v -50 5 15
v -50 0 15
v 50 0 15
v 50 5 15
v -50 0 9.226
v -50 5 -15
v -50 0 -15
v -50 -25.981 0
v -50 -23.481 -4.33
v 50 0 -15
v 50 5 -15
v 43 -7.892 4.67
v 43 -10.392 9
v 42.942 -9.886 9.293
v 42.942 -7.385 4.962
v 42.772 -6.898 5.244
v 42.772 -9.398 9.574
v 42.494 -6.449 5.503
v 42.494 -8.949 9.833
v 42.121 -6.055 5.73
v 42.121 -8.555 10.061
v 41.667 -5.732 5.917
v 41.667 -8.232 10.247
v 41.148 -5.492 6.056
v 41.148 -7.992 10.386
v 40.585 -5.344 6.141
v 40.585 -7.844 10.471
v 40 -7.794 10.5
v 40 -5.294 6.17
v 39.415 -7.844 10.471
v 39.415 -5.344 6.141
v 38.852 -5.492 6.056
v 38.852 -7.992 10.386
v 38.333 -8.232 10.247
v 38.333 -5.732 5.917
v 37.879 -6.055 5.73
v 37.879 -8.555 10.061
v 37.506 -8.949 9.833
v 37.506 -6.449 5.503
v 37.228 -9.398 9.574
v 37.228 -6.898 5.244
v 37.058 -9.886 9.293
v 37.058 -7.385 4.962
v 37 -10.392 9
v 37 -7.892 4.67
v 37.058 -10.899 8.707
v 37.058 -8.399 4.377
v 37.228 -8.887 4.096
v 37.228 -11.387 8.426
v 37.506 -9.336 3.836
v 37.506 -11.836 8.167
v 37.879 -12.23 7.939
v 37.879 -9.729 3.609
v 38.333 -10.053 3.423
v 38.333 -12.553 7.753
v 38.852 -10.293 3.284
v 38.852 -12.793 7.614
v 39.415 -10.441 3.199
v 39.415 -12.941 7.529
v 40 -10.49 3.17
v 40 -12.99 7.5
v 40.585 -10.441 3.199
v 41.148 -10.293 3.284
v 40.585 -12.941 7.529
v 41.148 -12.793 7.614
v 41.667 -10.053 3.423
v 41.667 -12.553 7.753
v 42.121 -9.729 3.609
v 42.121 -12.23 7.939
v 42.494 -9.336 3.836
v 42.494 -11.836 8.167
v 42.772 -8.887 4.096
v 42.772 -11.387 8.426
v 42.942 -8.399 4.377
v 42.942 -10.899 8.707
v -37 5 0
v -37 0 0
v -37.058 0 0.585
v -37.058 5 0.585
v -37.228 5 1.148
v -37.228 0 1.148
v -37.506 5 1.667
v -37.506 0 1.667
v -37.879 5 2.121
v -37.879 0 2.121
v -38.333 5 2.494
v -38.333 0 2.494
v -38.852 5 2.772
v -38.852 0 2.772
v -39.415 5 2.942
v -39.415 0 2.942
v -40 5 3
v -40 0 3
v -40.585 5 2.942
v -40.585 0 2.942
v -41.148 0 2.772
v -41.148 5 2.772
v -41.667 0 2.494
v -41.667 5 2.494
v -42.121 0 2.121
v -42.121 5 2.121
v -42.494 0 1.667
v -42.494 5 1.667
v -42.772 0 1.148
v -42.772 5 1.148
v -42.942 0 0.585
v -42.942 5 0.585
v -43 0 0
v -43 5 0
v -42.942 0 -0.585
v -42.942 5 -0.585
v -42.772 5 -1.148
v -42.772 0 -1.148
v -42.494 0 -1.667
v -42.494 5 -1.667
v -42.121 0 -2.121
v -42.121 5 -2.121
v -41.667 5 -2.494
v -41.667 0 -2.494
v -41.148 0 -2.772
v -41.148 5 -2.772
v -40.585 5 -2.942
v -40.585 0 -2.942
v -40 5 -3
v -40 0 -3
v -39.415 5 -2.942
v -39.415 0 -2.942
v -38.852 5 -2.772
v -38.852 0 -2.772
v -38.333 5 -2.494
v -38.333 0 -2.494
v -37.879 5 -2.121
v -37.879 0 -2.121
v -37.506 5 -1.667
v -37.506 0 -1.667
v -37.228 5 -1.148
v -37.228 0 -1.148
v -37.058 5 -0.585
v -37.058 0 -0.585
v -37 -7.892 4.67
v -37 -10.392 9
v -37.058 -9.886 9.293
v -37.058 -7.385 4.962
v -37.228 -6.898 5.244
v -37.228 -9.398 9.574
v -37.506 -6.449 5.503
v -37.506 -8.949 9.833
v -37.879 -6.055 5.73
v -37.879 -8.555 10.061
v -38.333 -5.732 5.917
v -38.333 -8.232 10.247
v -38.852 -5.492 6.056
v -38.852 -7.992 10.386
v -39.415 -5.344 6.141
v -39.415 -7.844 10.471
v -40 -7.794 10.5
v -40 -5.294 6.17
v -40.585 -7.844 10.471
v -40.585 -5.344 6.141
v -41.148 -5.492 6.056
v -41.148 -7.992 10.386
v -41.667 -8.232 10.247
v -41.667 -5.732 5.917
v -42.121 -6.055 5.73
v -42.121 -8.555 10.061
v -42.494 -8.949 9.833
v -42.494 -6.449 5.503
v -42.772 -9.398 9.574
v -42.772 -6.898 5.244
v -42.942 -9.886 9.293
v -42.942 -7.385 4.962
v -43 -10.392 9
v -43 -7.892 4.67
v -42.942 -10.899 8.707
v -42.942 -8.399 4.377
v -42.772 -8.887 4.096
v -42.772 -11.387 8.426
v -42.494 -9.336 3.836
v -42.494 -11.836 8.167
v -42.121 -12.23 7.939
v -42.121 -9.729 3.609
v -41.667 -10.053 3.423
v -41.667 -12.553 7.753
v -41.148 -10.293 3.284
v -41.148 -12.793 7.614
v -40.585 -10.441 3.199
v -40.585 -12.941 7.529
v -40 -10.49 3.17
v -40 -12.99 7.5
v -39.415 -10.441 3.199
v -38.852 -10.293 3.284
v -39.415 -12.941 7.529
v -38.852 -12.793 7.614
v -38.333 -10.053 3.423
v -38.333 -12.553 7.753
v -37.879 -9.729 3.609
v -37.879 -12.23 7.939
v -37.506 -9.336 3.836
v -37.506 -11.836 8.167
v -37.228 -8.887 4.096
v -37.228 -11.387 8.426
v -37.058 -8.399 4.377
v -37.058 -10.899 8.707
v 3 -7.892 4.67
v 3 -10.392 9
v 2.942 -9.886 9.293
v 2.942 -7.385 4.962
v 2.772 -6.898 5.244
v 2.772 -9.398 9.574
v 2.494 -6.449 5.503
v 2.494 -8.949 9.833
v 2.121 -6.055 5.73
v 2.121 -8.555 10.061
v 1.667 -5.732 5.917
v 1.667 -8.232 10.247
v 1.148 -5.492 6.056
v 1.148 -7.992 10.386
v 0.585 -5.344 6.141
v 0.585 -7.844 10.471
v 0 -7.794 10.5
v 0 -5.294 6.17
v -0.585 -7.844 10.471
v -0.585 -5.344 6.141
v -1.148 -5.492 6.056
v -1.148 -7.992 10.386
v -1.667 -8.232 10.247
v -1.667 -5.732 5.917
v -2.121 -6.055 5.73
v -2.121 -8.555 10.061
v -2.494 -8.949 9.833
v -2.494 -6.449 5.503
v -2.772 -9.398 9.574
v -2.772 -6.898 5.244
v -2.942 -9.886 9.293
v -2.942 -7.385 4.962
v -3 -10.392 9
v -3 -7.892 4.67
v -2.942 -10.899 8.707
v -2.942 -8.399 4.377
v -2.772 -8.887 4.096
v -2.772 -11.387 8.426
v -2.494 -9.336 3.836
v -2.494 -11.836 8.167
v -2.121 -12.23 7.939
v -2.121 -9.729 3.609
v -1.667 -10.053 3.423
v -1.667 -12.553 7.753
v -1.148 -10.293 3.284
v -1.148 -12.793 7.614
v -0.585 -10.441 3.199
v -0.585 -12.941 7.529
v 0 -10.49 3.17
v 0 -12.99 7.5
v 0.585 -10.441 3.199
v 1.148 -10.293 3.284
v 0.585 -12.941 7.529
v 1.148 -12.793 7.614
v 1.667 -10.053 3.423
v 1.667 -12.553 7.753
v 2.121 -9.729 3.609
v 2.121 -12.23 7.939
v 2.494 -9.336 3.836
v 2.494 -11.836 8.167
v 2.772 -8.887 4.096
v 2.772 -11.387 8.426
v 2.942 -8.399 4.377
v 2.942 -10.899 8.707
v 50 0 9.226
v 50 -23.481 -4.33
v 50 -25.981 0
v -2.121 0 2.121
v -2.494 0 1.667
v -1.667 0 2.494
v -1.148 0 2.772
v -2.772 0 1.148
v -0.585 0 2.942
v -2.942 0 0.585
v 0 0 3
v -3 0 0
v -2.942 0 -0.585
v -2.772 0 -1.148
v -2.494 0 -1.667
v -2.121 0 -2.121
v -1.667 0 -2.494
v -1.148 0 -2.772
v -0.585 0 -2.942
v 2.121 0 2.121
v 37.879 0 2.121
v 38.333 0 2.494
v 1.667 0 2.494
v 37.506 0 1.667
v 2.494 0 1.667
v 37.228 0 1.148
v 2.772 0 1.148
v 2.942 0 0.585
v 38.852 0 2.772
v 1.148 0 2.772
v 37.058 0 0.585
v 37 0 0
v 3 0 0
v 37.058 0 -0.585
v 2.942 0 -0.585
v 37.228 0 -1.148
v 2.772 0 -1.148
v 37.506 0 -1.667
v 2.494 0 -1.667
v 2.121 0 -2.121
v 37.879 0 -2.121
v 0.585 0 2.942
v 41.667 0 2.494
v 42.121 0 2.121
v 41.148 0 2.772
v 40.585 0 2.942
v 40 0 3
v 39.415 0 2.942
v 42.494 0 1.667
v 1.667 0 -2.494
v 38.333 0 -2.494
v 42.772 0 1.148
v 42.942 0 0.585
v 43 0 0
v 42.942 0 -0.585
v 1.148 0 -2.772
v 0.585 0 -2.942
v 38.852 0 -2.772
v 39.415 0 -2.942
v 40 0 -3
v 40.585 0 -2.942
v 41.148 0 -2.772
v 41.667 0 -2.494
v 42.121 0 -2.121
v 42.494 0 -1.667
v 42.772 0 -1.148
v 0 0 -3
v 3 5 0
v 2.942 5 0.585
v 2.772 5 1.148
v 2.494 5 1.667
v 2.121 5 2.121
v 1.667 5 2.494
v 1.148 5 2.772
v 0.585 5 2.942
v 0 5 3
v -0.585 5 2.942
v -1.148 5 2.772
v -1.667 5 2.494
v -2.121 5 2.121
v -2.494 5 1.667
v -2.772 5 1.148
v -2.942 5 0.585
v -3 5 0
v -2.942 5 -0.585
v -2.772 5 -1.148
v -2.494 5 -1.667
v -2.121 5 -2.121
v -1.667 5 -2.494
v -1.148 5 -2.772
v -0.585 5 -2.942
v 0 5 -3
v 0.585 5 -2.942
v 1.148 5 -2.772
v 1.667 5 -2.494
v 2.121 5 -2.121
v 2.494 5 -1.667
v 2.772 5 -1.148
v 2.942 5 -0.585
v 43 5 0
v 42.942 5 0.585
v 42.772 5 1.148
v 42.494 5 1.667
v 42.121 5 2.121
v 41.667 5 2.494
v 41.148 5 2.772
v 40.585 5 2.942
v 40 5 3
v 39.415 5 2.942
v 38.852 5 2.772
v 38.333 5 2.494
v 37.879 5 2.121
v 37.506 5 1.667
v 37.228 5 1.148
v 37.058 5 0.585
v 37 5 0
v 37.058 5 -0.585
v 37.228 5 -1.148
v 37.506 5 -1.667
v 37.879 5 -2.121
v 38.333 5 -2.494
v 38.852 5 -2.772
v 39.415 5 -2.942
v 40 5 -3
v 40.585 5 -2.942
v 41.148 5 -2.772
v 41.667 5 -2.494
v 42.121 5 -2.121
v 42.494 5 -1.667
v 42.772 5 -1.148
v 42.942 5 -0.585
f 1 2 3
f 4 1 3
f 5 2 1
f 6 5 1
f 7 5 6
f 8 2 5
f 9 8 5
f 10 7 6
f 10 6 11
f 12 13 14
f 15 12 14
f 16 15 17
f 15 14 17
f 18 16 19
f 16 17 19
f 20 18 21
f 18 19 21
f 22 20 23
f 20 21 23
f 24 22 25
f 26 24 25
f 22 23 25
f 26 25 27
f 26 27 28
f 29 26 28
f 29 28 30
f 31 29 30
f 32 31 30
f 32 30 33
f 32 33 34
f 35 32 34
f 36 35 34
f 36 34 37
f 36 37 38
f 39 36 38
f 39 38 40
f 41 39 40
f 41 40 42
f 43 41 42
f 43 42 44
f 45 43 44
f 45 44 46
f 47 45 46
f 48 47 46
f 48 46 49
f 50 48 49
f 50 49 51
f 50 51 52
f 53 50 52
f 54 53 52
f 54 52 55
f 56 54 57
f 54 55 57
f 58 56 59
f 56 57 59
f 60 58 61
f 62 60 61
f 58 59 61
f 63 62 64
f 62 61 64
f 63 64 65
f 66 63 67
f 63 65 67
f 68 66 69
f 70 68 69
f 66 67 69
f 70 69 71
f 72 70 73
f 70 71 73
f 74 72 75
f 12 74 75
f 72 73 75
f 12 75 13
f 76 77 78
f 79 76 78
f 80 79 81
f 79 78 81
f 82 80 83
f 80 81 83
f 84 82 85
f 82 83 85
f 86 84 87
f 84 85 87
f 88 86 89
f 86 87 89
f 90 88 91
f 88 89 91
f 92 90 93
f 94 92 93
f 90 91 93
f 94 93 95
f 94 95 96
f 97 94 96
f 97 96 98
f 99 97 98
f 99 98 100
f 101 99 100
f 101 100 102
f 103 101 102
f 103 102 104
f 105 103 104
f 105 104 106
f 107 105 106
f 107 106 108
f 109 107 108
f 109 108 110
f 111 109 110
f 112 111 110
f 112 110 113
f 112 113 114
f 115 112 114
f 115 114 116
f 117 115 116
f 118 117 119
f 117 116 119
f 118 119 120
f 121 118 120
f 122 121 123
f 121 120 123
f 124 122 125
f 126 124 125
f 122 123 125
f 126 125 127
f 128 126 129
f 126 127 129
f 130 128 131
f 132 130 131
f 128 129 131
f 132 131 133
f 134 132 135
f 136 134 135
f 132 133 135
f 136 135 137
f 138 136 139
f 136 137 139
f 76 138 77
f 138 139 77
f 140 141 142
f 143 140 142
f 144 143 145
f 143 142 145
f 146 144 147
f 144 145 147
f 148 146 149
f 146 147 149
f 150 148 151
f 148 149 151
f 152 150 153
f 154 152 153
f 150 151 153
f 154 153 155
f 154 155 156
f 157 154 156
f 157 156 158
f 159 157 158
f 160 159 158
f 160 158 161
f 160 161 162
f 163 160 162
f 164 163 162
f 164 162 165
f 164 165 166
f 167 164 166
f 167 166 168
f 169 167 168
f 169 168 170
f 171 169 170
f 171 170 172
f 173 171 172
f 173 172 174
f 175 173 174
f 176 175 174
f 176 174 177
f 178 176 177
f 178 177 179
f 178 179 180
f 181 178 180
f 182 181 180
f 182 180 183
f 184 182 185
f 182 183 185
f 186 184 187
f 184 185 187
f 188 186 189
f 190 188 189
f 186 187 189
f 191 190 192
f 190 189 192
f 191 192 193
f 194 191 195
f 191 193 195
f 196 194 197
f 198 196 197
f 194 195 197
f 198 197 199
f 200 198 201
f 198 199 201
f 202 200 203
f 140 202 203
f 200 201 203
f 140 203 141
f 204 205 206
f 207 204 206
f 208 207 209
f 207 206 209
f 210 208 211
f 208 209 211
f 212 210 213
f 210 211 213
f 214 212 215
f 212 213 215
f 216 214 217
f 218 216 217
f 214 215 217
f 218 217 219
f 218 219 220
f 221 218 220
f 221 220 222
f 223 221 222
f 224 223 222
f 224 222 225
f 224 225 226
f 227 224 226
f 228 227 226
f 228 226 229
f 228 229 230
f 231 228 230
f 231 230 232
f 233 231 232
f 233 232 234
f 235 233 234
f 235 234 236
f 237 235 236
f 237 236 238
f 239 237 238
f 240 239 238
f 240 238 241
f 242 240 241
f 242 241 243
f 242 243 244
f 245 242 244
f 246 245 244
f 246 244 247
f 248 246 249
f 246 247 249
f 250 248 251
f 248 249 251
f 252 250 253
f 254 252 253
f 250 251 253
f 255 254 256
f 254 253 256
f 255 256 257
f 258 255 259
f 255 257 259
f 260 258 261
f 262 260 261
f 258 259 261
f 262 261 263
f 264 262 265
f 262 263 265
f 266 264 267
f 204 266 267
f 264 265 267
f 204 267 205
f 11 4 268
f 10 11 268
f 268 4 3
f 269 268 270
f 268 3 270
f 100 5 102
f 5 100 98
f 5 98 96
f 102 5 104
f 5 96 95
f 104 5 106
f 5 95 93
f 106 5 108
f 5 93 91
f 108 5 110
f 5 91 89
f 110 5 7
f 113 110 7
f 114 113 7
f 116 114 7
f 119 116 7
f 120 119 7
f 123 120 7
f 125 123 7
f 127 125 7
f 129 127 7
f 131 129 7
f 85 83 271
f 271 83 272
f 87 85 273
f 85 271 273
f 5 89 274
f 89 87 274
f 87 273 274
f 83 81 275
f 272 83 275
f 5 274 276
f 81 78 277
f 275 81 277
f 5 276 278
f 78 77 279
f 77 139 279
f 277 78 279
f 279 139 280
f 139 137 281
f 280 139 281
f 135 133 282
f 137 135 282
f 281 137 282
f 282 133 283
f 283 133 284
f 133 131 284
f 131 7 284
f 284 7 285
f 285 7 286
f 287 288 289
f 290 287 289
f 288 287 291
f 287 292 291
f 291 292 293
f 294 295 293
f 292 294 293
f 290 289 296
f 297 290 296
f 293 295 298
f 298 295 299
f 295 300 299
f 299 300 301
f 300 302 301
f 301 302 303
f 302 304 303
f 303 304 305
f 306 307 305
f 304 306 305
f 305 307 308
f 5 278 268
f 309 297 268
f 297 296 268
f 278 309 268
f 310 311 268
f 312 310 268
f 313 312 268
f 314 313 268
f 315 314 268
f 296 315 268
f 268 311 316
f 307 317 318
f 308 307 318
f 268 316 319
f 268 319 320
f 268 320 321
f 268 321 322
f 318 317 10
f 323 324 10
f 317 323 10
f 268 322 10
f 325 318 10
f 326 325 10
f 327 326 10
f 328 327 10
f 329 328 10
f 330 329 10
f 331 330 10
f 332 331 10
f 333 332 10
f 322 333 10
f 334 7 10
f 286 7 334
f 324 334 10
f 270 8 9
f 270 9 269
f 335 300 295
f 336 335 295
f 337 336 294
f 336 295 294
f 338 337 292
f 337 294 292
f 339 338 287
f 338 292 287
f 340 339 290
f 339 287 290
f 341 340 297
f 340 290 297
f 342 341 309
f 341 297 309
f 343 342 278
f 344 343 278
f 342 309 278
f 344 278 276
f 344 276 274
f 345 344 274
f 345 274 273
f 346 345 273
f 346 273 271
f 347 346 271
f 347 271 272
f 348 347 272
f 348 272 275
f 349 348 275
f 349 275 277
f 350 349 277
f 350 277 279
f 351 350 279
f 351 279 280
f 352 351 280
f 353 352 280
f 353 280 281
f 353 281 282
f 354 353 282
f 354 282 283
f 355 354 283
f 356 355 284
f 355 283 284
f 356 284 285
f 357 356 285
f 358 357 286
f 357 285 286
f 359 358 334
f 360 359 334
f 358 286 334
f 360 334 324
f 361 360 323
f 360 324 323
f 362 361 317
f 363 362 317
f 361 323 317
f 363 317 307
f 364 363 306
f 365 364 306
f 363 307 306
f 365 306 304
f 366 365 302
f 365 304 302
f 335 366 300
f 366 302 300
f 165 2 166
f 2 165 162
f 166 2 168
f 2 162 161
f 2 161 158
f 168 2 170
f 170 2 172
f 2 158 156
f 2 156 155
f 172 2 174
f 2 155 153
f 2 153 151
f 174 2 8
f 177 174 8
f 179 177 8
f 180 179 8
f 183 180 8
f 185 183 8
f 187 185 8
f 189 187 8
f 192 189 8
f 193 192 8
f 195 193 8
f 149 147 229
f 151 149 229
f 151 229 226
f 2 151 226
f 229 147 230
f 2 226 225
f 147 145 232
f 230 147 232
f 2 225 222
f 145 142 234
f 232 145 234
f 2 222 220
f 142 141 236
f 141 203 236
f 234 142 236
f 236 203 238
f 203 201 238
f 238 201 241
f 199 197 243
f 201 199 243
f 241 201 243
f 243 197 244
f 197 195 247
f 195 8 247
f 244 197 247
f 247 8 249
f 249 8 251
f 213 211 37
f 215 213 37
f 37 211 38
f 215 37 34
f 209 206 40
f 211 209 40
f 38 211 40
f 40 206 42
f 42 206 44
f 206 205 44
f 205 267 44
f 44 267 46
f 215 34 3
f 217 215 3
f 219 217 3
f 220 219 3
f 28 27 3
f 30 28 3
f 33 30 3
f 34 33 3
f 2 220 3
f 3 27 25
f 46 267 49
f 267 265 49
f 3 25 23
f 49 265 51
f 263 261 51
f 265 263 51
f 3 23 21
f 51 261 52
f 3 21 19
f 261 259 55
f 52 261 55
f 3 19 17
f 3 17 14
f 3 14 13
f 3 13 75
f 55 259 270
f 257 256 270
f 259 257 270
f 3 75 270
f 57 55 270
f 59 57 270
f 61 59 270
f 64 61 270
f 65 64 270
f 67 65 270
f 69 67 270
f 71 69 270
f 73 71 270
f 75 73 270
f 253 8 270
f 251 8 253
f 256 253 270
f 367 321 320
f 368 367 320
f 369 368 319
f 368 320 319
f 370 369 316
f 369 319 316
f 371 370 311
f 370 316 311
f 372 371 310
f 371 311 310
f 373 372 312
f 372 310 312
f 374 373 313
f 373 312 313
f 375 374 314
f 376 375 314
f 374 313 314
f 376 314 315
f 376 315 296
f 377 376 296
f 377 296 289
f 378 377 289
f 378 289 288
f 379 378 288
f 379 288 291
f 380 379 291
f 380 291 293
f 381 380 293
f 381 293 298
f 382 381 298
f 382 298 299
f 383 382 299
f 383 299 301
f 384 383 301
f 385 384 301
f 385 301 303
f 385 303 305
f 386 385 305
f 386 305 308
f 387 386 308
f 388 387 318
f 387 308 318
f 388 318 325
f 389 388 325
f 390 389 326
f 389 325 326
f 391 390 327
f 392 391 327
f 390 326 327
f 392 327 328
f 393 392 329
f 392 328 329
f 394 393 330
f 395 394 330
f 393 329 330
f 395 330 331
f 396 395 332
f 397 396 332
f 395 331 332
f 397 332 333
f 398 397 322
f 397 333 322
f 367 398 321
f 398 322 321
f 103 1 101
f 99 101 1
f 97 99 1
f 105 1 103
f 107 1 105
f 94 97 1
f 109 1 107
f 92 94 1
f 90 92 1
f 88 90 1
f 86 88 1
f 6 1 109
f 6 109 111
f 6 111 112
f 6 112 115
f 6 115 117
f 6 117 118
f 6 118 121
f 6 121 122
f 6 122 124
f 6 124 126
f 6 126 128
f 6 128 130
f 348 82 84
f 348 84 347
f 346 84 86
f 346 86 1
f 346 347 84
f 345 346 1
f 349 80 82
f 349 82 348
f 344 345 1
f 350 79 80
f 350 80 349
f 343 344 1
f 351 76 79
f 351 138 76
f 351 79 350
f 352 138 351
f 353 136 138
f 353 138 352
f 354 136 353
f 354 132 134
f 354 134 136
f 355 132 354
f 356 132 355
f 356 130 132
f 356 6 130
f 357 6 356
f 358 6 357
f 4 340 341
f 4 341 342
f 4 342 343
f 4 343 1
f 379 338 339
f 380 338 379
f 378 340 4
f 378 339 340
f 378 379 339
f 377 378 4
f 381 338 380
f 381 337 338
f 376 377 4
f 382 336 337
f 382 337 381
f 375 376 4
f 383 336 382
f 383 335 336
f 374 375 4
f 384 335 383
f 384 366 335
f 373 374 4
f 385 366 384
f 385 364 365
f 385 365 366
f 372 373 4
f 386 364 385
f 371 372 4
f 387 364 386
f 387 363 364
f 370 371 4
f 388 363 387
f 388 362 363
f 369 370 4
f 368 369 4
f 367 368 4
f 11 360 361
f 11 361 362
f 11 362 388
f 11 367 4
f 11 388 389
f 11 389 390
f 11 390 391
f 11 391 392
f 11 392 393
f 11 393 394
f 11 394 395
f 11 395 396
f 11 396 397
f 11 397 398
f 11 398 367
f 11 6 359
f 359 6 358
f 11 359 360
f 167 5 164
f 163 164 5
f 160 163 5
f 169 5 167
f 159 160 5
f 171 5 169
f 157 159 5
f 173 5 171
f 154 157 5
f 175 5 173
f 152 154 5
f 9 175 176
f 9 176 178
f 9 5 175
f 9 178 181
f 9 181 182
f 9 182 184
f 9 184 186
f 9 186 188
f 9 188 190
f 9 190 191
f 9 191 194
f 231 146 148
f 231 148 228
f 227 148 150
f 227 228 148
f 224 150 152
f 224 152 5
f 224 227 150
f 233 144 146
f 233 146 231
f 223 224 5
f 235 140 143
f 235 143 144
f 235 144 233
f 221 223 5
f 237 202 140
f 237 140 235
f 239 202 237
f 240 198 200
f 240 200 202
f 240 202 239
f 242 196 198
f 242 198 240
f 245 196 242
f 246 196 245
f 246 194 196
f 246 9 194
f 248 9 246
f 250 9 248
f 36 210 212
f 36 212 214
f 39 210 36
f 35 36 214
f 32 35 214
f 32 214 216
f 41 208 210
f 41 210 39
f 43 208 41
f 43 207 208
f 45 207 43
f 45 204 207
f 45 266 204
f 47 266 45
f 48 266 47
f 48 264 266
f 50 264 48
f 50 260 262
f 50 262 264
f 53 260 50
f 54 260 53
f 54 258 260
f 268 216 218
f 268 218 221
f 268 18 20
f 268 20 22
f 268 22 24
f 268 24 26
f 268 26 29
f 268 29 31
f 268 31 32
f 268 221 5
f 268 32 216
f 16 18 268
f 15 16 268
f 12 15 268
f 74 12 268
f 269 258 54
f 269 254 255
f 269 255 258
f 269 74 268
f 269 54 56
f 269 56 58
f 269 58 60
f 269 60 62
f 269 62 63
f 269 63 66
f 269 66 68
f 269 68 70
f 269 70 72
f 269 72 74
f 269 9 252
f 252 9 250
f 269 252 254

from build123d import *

# Parameters (mm, degrees)
BOSS_EXTRUDE1_START = -0.0001
SKETCH2_W           = 100
SKETCH2_H           = 30
BOSS_EXTRUDE1_DEPTH = 5.0001
CIRPATTERN1_COUNT   = 2
CIRPATTERN1_ANGLE   = 60
SKETCH4_R           = 3
CUT_EXTRUDE1_DEPTH  = 10
SKETCH5_R           = 3
CUT_EXTRUDE2_DEPTH  = 10


with BuildPart() as part:
    # Sketch2 → Boss-Extrude1 (new body)
    with BuildSketch(Plane(origin=(0, 0, 0), x_dir=(1, 0, 0), z_dir=(0, 1, 0)).offset(BOSS_EXTRUDE1_START)):
        Rectangle(SKETCH2_W, SKETCH2_H)
    boss_extrude1 = extrude(amount=BOSS_EXTRUDE1_DEPTH)

    # CirPattern1: Boss-Extrude1 ×2 about axis
    cirpattern1_axis = Axis((0, -0.0001, 15), (-1, 0, 0))
    for i in range(1, CIRPATTERN1_COUNT):
        add(boss_extrude1.rotate(cirpattern1_axis, i * CIRPATTERN1_ANGLE / (CIRPATTERN1_COUNT - 1)))

    # Sketch4 → Cut-Extrude1 (cut)
    with BuildSketch(Plane.XZ.offset(0.0001)):
        Circle(SKETCH4_R)
        with Locations((40, 0)):
            Circle(SKETCH4_R)
        with Locations((-40, 0)):
            Circle(SKETCH4_R)
    extrude(amount=-CUT_EXTRUDE1_DEPTH, mode=Mode.SUBTRACT)

    # Sketch5 → Cut-Extrude2 (cut)
    with BuildSketch(Plane(origin=(0, -6.495215528, 11.250043301), x_dir=(1, 0, 0), z_dir=(0, -0.5, 0.866025404))):
        with Locations((40, -4.500086603)):
            Circle(SKETCH5_R)
        with Locations((0, -4.500086603)):
            Circle(SKETCH5_R)
        with Locations((-40, -4.500086603)):
            Circle(SKETCH5_R)
    extrude(amount=-CUT_EXTRUDE2_DEPTH, mode=Mode.SUBTRACT)


solid = part.part
